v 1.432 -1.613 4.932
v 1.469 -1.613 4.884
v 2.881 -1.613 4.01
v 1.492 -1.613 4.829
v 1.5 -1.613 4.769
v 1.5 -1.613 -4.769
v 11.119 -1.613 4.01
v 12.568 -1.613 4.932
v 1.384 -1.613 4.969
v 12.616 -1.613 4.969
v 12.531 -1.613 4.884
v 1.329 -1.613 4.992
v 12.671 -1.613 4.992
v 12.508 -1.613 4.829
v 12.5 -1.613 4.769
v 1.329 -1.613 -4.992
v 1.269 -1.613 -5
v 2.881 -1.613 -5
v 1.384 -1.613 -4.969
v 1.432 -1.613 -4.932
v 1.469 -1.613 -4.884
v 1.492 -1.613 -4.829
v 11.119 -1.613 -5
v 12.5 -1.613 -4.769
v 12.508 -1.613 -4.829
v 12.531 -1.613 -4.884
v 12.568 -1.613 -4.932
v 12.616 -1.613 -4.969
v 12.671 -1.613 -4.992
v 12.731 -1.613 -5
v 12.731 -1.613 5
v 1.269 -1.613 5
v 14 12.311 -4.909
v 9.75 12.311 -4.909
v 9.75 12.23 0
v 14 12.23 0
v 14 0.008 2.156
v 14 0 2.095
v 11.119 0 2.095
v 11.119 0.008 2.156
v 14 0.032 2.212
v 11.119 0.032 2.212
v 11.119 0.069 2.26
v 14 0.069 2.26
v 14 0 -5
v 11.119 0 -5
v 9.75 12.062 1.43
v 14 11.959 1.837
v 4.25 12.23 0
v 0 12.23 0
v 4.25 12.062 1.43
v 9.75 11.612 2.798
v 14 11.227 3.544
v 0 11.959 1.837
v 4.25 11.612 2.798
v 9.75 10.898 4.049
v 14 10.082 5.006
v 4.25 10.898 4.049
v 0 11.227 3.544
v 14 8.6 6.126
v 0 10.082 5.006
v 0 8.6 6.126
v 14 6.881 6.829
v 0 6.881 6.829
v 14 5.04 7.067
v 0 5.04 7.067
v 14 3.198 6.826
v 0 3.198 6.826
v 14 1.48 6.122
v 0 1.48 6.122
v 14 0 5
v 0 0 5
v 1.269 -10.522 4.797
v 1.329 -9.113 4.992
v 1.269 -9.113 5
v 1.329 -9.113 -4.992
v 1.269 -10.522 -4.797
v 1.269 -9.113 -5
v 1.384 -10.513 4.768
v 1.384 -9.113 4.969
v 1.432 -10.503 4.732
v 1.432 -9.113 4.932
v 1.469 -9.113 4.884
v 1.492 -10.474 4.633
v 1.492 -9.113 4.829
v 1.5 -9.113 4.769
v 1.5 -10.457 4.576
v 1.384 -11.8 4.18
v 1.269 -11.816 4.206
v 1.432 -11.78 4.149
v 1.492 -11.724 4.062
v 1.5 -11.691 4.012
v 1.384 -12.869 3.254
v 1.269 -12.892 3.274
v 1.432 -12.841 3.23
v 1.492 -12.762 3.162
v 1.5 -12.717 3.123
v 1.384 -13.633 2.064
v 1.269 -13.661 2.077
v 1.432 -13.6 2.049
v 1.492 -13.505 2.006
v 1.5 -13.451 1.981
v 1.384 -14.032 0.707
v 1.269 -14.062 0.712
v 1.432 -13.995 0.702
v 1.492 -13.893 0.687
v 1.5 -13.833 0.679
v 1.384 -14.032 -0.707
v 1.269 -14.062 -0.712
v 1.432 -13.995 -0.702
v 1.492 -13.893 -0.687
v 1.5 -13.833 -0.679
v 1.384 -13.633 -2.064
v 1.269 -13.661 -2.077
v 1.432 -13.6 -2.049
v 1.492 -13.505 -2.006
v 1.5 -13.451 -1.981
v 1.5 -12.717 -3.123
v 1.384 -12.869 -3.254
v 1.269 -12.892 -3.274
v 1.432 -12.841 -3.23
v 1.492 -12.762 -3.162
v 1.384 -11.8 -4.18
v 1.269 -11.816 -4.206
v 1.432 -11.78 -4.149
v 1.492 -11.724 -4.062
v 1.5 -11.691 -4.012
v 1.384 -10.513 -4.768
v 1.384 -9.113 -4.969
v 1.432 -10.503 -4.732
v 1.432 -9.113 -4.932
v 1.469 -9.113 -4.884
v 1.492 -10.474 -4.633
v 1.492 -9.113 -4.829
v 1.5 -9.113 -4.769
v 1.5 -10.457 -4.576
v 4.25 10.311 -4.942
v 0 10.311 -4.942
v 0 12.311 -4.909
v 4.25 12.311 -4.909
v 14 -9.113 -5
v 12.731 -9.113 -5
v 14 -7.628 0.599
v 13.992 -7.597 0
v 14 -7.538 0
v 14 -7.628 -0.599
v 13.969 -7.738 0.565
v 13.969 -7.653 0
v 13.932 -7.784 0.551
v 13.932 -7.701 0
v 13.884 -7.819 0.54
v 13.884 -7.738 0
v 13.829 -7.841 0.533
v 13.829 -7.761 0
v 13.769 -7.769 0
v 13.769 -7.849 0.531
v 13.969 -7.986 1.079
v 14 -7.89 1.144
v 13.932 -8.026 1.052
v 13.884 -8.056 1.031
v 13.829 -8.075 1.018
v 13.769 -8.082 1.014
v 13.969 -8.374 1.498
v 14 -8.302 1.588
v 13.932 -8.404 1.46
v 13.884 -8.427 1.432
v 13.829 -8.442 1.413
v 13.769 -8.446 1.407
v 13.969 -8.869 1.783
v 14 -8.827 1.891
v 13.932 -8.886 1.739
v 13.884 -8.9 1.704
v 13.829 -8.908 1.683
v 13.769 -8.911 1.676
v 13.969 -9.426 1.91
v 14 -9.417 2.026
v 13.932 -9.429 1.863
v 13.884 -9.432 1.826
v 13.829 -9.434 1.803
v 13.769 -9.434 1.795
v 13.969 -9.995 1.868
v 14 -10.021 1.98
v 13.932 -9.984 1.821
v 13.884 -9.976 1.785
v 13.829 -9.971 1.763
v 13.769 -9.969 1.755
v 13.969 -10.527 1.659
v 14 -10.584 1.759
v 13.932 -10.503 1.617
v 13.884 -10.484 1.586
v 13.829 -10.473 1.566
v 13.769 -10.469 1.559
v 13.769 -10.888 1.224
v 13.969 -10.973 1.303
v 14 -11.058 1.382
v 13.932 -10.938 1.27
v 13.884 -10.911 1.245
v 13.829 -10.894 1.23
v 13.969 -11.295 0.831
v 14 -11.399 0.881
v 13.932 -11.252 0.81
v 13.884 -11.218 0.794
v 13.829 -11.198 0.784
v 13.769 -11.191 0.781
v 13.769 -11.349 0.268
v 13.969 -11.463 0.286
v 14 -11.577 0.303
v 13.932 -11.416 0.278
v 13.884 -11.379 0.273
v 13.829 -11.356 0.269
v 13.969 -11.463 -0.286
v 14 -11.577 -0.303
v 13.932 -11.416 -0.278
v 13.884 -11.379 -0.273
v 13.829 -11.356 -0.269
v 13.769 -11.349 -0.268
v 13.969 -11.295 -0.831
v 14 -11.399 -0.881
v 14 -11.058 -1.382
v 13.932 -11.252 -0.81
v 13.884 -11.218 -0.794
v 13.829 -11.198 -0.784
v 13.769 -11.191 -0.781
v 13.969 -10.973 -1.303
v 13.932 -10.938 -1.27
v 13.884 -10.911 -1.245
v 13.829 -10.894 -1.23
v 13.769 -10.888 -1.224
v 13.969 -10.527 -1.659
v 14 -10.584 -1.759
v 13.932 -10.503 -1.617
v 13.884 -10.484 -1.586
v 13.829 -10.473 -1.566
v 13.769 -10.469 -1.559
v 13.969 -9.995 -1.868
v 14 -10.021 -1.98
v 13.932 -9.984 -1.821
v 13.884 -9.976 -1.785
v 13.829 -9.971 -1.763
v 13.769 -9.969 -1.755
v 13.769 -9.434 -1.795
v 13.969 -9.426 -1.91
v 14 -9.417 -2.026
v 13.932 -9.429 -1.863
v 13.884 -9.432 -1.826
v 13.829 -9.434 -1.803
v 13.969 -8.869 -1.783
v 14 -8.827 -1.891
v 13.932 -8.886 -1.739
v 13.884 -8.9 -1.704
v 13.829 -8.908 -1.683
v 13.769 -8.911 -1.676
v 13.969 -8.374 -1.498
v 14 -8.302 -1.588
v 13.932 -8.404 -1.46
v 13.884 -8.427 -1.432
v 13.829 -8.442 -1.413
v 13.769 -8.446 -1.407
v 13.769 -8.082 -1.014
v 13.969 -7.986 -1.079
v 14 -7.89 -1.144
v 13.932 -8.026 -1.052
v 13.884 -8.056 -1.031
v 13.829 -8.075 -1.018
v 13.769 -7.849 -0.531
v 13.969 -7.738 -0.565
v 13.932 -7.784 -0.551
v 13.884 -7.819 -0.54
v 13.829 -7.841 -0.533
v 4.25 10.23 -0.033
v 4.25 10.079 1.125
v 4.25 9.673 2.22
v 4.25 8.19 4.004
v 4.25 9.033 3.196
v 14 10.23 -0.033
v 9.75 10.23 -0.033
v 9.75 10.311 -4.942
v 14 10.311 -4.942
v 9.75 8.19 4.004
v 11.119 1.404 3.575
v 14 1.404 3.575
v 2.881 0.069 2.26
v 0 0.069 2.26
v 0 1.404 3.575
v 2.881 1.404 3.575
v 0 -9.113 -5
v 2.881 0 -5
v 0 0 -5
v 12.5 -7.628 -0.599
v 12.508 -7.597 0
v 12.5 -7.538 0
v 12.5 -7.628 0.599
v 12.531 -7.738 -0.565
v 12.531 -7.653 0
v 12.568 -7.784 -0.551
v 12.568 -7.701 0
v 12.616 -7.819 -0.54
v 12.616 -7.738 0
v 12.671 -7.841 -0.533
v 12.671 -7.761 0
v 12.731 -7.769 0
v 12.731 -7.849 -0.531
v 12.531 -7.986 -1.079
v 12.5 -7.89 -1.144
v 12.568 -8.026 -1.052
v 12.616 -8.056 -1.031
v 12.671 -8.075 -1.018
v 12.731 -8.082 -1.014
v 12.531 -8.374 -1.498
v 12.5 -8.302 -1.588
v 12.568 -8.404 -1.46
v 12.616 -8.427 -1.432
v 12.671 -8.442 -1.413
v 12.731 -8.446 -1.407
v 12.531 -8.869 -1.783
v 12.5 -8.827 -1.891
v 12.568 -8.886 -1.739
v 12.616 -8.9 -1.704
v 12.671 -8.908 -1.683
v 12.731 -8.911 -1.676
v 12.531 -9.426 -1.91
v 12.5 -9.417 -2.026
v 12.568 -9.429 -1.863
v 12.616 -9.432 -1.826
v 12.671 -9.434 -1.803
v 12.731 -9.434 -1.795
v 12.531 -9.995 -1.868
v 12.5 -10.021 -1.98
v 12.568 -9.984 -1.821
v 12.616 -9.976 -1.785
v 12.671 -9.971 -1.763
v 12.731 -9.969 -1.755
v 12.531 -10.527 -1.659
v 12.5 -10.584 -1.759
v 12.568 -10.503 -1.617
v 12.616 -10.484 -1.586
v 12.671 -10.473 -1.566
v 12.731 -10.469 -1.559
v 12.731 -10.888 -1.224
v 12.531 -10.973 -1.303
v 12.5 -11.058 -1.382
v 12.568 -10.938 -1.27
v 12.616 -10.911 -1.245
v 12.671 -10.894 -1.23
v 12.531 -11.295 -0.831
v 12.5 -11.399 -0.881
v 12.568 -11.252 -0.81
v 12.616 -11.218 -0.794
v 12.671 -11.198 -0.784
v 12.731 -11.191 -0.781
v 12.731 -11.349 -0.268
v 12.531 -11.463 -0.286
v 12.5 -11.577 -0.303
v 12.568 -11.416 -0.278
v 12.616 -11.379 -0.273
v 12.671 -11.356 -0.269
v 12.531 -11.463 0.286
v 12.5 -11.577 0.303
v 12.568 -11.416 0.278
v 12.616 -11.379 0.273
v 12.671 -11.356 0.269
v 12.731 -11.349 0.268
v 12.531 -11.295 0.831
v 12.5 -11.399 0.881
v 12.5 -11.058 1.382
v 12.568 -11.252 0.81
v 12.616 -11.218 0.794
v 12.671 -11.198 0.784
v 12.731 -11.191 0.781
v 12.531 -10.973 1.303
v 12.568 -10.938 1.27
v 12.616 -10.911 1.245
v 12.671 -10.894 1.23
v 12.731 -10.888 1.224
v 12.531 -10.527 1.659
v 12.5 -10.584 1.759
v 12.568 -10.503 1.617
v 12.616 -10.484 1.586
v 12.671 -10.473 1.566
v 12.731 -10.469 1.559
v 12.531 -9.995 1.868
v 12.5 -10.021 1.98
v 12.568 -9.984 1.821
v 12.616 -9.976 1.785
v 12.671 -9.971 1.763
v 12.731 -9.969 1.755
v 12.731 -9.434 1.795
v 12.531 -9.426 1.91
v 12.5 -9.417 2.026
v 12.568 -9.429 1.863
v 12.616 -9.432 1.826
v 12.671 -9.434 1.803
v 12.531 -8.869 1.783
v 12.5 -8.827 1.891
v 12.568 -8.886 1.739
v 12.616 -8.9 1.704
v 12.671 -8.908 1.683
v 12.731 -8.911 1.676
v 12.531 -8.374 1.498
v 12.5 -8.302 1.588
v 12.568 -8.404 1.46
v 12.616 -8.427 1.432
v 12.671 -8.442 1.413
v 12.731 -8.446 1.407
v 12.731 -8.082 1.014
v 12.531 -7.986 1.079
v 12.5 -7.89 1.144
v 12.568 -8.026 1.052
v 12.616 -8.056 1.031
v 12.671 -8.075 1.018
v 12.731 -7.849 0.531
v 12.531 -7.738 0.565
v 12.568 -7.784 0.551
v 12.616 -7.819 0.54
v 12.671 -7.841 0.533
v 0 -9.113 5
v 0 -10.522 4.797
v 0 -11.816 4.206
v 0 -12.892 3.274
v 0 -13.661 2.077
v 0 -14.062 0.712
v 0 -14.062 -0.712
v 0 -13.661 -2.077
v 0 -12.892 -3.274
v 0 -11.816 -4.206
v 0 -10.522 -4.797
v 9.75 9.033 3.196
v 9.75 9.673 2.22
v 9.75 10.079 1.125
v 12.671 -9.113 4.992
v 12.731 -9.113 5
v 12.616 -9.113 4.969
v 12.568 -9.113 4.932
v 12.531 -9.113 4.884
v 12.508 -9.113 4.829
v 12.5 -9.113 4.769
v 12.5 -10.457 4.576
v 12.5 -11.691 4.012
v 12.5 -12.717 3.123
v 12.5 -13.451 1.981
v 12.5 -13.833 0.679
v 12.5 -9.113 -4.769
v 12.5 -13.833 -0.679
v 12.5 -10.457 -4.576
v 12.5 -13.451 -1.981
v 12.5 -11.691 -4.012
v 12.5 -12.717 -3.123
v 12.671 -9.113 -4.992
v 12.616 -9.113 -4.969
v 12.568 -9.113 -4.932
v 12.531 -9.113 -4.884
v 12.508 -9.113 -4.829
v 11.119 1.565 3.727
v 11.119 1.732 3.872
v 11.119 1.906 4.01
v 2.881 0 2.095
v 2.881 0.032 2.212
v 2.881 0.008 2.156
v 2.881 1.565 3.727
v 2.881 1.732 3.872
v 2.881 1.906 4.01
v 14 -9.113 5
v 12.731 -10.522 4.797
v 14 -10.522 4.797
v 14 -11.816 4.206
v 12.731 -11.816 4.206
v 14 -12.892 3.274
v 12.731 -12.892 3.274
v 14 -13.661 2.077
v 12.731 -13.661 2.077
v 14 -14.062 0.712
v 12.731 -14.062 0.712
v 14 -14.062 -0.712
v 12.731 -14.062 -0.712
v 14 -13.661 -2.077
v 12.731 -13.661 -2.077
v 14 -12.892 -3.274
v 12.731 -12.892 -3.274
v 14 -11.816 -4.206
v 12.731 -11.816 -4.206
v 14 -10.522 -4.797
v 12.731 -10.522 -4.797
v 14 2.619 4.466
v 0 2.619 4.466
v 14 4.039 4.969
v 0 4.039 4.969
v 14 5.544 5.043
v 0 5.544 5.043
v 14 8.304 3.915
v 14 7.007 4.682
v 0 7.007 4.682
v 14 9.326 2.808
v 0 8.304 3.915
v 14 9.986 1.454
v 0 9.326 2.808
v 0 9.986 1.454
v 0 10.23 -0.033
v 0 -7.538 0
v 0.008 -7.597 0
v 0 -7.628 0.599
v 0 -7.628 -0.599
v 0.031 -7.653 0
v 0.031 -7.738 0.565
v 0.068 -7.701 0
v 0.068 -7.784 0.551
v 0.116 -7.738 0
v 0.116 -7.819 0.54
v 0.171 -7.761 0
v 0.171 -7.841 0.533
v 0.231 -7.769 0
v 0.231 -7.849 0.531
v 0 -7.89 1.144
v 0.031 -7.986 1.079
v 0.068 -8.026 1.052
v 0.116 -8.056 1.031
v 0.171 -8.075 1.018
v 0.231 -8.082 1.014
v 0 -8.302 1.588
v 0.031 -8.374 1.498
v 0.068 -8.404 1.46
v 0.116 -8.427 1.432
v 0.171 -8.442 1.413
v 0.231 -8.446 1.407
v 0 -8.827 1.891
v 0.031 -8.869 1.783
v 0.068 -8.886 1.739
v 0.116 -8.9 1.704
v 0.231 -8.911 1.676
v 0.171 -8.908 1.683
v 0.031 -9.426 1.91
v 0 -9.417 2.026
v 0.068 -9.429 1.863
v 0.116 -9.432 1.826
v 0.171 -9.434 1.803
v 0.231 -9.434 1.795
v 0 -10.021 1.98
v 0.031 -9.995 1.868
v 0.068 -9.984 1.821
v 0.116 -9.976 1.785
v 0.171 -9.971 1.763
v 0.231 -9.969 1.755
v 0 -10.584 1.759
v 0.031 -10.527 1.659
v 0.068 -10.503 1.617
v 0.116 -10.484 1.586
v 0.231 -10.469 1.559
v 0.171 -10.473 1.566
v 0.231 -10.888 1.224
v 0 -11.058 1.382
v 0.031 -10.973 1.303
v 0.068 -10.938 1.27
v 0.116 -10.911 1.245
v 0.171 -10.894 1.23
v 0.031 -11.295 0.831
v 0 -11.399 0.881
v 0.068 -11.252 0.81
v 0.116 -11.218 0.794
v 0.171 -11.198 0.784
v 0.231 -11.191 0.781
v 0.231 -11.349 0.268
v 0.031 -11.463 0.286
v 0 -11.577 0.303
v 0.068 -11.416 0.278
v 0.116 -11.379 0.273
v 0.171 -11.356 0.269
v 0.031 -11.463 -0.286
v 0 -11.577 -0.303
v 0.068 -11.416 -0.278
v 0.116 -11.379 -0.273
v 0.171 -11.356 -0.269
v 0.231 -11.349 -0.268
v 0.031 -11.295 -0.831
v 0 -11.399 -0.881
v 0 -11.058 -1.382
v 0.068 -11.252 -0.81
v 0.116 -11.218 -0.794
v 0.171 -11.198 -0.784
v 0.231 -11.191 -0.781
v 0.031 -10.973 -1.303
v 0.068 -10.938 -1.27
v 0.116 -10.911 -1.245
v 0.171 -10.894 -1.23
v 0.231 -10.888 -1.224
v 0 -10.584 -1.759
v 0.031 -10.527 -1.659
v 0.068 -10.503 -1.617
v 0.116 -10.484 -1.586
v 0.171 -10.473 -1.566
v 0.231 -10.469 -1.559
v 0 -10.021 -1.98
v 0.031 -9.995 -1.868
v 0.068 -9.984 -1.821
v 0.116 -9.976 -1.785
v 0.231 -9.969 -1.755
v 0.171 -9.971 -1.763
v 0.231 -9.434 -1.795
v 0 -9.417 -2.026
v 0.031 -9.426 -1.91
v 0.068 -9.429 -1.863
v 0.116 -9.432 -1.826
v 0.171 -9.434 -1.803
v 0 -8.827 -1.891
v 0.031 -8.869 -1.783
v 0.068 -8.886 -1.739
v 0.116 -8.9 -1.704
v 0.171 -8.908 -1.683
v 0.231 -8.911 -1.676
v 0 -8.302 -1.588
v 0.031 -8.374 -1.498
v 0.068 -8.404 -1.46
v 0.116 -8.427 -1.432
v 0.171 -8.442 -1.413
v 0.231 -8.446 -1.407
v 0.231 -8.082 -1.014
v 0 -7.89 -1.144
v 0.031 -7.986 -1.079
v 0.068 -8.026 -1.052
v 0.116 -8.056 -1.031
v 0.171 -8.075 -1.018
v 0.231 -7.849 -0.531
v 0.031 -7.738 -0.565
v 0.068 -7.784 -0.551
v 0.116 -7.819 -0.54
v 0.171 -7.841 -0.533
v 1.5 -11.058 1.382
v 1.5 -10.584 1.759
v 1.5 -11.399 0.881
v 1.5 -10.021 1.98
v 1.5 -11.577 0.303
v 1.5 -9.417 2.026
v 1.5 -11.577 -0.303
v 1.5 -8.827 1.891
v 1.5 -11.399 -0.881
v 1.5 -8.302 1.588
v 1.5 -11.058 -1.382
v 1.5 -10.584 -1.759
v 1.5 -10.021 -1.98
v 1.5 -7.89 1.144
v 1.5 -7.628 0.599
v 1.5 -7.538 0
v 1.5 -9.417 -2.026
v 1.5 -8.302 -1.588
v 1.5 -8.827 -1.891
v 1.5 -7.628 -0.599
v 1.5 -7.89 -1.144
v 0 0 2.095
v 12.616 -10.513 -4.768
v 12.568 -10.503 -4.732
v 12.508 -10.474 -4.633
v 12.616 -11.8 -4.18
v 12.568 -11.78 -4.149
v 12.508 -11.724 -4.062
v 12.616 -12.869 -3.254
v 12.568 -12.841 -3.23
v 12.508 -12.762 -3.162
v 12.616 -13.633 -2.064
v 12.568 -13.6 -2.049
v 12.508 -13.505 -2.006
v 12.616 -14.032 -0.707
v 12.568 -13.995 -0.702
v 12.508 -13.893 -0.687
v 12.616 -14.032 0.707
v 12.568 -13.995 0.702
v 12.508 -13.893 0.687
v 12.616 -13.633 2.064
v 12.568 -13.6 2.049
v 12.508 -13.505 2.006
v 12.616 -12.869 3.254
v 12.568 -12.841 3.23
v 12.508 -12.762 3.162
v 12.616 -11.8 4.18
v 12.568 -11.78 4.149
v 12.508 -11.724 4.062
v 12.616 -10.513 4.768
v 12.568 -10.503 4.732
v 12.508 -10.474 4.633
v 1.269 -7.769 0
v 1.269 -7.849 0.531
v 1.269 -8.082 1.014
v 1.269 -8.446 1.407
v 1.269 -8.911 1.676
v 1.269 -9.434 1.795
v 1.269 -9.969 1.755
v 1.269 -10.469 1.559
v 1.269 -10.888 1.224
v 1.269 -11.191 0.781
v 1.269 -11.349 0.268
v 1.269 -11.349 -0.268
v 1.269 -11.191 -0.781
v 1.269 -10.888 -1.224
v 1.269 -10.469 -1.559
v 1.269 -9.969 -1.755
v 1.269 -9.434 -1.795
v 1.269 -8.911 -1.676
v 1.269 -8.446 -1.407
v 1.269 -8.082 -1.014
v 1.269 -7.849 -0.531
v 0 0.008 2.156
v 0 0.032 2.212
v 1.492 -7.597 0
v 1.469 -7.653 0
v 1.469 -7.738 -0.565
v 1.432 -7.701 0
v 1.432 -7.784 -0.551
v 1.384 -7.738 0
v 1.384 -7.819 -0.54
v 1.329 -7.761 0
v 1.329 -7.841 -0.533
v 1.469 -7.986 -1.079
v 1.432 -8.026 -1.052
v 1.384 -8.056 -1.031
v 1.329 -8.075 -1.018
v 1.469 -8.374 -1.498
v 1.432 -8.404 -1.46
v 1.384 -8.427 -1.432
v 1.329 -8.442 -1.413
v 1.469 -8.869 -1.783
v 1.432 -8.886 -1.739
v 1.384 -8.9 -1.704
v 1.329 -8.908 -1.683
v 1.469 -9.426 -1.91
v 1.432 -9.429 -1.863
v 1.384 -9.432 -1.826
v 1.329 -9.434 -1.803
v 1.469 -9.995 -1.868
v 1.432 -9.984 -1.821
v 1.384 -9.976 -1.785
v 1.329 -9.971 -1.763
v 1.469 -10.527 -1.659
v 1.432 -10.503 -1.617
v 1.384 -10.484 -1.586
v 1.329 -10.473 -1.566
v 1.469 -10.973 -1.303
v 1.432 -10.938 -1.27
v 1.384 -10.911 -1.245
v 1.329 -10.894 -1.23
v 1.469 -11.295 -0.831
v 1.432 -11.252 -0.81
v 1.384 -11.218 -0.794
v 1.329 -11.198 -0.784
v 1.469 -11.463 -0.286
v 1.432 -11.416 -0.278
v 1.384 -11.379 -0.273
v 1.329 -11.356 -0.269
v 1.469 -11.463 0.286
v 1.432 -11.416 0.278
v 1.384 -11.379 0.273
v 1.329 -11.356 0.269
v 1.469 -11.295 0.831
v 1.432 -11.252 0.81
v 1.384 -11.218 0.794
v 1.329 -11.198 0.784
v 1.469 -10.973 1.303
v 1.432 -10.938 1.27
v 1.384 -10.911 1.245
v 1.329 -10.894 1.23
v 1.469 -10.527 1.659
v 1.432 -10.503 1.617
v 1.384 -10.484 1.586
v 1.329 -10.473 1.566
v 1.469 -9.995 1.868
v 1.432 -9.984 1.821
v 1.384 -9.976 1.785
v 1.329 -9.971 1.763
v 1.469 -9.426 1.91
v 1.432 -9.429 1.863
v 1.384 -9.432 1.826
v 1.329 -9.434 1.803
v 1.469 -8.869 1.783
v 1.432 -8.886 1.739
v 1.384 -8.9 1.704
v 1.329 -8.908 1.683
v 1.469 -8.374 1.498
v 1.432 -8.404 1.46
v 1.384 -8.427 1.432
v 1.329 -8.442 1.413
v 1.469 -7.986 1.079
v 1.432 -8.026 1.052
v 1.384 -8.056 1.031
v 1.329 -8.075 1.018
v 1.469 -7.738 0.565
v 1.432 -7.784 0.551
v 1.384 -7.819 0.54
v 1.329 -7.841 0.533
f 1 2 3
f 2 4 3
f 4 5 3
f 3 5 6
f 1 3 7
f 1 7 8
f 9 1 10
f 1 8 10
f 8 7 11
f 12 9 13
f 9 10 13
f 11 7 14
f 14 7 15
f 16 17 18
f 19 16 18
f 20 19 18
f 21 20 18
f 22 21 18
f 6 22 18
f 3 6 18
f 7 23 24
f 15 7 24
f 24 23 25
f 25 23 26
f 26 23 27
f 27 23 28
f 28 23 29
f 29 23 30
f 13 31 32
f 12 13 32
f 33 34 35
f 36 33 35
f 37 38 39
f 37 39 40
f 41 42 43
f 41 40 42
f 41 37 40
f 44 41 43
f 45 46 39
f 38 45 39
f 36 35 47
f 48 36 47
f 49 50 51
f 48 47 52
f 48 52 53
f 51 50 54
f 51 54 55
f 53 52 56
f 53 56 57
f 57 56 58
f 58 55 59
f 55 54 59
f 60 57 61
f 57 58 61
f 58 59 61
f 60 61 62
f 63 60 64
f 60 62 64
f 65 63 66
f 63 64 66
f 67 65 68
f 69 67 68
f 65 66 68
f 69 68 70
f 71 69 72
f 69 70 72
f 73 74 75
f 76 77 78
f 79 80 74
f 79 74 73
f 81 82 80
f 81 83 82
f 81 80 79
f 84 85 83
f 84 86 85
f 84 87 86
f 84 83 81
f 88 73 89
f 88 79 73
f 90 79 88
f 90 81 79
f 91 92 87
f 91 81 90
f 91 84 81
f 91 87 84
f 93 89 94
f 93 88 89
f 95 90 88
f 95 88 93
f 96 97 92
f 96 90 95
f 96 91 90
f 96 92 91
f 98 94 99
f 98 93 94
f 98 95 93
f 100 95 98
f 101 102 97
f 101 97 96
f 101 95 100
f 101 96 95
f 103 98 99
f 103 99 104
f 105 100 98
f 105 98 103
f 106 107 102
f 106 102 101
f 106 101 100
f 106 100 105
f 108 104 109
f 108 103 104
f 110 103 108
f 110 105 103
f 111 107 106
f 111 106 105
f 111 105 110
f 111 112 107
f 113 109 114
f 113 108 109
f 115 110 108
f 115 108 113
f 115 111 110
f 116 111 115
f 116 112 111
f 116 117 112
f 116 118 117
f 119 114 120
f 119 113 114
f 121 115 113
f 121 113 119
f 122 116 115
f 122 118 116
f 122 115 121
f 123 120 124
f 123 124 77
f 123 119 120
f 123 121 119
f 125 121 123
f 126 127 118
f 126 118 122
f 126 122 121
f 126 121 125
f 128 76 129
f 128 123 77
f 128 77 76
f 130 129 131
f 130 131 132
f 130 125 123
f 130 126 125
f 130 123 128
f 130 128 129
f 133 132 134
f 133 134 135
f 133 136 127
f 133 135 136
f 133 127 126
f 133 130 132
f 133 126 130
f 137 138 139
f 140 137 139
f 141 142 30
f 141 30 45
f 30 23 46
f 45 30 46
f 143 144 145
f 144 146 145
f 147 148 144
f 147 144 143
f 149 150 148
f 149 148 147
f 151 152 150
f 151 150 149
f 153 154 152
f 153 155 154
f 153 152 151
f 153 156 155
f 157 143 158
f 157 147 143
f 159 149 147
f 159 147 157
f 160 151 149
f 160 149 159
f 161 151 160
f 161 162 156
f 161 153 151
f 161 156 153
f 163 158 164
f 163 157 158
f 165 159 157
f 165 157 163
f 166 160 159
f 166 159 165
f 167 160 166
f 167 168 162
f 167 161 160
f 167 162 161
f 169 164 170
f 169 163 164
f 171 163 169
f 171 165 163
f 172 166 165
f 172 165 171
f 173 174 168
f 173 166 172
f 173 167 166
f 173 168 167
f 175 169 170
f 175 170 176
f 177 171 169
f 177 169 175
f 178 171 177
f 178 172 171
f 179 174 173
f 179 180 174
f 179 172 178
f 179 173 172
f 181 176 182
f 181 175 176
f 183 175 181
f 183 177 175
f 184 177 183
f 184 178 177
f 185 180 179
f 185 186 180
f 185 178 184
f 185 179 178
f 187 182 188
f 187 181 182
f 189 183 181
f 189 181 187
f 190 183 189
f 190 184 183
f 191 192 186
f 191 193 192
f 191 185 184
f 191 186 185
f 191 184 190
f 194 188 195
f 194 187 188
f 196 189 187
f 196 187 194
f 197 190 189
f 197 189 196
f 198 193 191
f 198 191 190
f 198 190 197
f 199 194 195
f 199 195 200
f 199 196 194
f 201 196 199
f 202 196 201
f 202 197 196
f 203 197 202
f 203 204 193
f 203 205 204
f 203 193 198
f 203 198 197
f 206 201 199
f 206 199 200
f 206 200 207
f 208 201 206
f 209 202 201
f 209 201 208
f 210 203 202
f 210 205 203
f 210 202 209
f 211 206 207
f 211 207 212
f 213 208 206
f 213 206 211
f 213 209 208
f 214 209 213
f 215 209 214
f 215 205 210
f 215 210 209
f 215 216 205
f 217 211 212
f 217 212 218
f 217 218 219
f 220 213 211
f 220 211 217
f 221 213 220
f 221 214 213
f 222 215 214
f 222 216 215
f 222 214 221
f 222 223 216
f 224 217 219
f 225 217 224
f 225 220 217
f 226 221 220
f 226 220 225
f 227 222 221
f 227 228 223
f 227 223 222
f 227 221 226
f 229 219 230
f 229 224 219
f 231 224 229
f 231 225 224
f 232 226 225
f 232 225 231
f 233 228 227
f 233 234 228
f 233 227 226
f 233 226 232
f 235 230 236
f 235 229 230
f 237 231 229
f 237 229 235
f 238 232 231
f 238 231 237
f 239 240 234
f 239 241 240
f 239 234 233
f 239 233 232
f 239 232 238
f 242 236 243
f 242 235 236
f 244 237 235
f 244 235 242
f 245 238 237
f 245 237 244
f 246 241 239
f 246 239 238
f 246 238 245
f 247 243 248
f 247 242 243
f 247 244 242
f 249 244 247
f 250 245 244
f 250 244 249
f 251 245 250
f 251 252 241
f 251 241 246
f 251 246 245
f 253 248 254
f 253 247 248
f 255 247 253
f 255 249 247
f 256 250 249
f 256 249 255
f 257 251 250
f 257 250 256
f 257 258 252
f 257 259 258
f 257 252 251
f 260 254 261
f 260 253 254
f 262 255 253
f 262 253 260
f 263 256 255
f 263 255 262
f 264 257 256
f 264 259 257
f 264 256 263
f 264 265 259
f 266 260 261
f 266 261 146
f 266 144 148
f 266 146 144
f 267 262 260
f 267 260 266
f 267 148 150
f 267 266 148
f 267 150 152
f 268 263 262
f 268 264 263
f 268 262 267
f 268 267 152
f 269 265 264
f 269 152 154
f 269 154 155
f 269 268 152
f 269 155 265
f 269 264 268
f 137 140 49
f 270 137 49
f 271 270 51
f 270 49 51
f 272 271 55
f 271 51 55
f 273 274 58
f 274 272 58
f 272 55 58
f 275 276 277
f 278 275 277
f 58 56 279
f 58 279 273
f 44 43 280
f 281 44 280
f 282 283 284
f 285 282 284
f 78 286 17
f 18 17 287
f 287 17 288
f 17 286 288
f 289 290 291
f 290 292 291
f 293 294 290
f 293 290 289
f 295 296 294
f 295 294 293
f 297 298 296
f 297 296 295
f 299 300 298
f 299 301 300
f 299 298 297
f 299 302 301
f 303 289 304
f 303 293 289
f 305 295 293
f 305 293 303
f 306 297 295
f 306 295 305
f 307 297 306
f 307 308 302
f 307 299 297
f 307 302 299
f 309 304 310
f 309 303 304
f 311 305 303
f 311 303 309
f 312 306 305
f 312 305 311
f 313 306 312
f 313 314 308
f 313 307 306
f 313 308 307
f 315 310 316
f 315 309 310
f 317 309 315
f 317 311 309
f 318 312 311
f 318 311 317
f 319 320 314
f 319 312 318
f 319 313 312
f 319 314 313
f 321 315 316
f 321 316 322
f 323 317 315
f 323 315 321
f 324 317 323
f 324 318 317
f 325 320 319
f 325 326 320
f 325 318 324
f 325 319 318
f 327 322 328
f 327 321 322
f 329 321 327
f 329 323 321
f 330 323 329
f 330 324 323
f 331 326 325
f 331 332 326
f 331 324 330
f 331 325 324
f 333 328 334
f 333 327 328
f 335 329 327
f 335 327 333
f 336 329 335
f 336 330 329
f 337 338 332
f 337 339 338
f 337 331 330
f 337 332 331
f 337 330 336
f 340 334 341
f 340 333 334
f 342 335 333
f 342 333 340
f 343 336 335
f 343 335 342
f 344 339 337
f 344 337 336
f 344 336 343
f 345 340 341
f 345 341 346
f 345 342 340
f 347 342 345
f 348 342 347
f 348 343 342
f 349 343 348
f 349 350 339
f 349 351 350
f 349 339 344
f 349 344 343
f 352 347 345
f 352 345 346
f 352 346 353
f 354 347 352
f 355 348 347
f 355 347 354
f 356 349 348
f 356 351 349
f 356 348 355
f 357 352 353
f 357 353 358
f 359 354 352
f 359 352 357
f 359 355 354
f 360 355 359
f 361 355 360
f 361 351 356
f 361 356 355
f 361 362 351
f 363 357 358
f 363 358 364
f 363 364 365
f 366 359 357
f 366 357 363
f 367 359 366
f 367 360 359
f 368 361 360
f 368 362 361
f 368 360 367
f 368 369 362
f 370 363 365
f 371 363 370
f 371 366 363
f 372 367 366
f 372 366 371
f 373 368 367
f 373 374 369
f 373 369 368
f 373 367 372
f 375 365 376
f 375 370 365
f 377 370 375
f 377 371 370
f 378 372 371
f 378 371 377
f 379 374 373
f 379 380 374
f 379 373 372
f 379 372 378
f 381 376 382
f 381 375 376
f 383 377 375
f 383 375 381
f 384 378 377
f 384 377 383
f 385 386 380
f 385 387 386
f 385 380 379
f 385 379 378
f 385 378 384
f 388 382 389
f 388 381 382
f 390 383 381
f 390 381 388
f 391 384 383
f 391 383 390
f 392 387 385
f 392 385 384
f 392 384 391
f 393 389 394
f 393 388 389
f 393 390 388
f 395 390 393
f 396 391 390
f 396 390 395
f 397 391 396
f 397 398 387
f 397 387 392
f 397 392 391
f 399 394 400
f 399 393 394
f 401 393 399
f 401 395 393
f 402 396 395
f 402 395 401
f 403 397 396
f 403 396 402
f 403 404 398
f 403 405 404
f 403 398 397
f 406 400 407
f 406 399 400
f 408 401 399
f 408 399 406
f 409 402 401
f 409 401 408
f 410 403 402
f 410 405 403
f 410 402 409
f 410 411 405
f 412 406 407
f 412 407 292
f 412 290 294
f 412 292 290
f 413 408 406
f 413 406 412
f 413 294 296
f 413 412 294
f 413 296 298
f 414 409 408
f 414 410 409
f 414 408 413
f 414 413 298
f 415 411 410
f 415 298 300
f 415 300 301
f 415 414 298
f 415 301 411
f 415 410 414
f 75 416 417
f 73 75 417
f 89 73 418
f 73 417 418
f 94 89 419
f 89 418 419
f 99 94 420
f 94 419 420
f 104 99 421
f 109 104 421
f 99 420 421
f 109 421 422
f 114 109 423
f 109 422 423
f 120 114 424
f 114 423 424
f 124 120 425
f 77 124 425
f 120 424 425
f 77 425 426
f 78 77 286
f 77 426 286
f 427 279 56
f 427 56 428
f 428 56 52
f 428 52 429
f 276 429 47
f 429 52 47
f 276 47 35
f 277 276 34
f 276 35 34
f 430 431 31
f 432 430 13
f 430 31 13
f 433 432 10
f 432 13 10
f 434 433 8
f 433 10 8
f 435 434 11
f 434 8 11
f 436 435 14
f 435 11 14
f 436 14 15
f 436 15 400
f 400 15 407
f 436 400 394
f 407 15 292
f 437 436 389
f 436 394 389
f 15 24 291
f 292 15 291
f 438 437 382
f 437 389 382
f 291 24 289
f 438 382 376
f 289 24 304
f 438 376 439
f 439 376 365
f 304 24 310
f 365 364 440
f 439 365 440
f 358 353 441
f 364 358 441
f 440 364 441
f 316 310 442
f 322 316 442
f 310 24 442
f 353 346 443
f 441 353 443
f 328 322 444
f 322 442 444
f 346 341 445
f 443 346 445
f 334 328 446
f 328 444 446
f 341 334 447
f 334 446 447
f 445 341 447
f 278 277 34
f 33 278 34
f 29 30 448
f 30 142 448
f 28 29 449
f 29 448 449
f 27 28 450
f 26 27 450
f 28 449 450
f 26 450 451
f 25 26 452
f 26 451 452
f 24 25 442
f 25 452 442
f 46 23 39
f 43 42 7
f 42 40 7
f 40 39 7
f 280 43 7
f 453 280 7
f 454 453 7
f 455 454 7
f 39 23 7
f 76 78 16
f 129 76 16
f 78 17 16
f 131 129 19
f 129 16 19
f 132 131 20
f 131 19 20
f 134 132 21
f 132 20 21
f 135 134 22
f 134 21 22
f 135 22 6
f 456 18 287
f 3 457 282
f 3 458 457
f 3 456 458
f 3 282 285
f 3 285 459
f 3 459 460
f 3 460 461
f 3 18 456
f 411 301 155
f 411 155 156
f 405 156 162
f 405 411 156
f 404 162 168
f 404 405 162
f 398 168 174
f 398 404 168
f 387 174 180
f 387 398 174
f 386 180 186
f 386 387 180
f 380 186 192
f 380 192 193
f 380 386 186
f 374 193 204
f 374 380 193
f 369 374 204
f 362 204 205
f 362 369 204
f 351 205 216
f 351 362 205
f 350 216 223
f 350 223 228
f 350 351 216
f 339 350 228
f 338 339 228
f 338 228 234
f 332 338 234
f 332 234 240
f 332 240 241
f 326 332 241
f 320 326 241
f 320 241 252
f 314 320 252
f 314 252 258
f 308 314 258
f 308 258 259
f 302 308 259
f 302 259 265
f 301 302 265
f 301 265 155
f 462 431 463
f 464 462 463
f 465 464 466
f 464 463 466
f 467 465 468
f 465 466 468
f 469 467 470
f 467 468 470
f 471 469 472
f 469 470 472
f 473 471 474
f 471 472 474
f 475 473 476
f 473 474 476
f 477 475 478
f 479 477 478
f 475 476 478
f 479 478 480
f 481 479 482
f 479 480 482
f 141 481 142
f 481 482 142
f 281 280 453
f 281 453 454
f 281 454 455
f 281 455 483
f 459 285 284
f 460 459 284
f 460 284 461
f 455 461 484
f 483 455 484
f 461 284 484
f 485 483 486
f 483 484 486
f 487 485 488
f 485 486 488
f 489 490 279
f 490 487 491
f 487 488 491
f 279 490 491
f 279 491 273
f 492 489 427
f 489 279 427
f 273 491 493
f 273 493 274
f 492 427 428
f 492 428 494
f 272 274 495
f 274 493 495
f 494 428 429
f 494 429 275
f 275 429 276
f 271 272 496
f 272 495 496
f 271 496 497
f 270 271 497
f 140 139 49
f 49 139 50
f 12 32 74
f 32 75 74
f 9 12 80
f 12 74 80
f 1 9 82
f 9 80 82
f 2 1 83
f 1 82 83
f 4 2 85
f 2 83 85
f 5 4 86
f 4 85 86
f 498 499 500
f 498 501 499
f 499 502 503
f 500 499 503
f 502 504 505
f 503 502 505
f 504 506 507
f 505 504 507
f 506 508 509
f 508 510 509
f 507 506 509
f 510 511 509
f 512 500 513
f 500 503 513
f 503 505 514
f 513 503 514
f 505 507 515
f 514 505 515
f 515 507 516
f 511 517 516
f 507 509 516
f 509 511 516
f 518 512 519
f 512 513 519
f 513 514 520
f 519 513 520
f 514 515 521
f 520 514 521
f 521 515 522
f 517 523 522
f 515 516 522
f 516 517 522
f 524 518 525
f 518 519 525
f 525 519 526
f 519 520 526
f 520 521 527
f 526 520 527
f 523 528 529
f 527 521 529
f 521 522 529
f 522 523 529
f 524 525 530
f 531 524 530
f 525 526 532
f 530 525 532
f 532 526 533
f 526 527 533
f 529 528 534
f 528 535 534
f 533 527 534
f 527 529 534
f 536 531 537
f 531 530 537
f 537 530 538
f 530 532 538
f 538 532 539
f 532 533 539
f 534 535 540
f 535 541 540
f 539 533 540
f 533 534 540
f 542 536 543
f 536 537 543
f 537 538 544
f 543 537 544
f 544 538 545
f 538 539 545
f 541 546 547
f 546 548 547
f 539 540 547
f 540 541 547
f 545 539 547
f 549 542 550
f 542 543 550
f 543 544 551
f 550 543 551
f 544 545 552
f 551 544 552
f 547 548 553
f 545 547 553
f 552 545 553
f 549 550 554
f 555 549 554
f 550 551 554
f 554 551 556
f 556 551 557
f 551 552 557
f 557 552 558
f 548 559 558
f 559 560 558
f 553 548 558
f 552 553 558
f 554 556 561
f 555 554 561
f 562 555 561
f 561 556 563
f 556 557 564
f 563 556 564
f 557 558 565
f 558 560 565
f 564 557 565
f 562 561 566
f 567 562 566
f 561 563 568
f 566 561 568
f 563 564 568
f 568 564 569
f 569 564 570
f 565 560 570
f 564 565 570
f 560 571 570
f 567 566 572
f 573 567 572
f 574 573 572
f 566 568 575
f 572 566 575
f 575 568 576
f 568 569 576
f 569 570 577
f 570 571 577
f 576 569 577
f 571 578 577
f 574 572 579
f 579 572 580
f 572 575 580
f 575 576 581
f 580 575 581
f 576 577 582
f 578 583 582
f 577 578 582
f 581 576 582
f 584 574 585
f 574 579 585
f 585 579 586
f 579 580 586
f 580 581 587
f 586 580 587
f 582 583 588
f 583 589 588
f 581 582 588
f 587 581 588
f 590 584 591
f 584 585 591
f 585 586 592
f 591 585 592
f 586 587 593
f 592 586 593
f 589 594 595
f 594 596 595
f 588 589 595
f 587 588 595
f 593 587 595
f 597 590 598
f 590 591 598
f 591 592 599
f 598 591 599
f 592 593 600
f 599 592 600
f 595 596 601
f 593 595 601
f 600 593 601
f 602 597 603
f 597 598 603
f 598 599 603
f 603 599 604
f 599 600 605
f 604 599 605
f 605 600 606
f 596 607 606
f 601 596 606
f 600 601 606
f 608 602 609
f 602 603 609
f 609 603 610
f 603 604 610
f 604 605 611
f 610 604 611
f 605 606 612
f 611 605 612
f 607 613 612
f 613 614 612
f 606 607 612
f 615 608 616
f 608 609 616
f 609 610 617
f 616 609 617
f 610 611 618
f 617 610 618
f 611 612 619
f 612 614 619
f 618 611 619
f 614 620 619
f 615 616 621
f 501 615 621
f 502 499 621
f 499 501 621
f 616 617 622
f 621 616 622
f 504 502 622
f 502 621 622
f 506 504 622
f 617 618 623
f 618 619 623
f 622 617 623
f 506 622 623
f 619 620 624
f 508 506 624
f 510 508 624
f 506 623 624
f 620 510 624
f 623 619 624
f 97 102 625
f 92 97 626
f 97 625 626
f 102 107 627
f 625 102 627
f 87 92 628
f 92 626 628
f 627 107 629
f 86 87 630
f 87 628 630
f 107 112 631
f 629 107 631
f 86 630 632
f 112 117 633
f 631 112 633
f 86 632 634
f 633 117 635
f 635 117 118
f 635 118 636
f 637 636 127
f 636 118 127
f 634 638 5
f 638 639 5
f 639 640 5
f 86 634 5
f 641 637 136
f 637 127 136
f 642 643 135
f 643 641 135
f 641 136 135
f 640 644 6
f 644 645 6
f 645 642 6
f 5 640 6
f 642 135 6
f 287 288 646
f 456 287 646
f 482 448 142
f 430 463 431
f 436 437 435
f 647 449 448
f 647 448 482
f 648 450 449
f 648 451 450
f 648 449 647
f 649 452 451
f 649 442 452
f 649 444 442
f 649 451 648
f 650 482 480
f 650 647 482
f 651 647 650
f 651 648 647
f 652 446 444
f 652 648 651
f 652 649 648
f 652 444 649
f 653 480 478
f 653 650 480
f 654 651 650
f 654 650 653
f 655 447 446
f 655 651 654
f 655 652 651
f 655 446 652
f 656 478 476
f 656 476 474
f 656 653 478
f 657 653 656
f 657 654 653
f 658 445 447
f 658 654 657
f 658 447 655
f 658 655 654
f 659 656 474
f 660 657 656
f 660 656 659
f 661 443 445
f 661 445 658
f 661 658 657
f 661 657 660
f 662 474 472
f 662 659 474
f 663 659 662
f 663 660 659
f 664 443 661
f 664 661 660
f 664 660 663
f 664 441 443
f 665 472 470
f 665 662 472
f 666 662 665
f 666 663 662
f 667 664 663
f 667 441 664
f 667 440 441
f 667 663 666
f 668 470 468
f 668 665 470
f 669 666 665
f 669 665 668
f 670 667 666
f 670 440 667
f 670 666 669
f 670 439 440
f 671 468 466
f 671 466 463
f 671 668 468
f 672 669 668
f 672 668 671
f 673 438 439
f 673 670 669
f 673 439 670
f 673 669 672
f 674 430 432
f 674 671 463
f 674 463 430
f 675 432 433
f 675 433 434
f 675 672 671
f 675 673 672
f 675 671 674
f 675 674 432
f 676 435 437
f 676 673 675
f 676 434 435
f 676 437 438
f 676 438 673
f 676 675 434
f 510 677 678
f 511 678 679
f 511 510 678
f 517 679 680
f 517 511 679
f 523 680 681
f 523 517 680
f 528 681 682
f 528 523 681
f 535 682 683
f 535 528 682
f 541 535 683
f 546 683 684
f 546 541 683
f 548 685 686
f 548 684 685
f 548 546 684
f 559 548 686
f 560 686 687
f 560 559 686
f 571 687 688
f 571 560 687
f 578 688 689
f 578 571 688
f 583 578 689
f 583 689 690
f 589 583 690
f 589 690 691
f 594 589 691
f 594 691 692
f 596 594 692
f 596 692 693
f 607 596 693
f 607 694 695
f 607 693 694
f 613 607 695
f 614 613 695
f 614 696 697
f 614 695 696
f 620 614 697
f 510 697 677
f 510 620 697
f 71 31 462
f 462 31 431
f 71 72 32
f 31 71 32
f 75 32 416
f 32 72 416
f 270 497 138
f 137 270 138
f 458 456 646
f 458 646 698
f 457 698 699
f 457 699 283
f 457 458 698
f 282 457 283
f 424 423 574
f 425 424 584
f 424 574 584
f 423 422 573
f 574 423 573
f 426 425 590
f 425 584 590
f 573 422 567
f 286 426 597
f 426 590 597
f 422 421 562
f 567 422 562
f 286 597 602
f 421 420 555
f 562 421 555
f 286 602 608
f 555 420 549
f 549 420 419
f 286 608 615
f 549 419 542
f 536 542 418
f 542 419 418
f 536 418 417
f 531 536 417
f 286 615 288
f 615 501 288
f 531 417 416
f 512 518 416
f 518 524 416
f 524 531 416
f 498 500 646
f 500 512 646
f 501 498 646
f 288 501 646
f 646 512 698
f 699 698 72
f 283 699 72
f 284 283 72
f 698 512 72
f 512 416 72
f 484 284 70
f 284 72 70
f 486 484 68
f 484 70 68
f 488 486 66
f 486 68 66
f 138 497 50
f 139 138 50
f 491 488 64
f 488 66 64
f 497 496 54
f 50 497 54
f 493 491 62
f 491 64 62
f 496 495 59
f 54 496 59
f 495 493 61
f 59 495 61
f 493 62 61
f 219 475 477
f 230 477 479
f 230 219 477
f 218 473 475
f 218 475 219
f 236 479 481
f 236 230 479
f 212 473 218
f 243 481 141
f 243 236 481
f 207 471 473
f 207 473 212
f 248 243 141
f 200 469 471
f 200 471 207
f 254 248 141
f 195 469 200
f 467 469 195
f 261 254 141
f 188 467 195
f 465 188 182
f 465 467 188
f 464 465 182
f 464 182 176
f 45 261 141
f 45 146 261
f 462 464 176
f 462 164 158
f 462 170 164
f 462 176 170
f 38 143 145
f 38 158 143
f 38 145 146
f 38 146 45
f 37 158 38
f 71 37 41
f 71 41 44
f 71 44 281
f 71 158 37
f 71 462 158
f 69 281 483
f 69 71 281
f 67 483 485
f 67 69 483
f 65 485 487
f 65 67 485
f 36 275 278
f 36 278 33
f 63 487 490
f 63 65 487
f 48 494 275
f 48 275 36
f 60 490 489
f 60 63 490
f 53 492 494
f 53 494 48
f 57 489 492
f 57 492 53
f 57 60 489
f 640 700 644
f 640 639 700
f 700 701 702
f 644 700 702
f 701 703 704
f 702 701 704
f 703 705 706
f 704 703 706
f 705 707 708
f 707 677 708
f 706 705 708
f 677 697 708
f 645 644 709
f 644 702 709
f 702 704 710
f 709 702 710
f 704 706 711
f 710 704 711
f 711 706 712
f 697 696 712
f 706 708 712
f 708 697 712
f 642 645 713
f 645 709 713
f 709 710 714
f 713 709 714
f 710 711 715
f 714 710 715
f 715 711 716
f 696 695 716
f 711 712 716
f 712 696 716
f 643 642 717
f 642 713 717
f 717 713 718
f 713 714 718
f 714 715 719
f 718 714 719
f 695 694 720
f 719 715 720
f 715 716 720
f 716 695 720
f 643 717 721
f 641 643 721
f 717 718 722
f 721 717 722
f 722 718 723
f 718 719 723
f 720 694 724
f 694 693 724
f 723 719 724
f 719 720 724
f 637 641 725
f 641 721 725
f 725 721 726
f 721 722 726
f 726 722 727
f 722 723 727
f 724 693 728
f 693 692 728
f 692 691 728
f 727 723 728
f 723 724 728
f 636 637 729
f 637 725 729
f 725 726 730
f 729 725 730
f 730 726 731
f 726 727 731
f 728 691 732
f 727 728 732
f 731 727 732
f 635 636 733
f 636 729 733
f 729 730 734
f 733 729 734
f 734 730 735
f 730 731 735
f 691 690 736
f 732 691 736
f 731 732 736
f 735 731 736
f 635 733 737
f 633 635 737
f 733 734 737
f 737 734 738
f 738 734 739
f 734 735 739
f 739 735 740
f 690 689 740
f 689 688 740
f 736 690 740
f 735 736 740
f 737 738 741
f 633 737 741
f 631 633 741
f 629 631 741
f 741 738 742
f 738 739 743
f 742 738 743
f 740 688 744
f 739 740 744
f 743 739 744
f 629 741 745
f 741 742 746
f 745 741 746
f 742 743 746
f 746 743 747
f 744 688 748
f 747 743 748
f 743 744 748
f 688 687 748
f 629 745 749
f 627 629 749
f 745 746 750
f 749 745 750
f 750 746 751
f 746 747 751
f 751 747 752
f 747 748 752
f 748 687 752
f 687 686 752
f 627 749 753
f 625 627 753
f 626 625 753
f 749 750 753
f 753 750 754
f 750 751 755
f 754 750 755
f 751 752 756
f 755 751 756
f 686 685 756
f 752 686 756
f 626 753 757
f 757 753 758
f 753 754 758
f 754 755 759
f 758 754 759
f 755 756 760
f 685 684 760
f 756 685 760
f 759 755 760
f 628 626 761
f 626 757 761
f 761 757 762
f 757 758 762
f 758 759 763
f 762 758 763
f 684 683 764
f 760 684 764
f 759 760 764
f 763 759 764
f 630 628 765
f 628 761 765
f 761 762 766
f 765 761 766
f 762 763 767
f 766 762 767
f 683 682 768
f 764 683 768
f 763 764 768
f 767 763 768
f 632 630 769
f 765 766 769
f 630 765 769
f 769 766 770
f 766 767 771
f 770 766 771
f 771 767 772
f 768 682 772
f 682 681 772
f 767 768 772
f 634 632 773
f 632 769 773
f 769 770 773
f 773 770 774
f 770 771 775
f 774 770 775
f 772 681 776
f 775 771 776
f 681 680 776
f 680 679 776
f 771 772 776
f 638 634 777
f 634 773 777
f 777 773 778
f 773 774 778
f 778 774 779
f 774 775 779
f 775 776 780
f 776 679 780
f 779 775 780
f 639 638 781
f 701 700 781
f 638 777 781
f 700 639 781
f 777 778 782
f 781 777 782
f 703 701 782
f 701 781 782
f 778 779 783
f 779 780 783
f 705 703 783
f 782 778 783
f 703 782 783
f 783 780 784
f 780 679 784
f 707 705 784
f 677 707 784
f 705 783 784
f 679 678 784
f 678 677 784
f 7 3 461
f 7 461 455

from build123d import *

# Parameters (mm, degrees)
F0_R     = 1.8
F1_DEPTH = 14
F2_W     = 5.5
F2_H     = 4.0708386075
F2_H_2   = 4.9094793208
F3_DEPTH = 5
F4_W     = 11
F4_H     = 7.5
F5_DEPTH = 12
F6_R     = 0.2312376478
F7_W     = 8.2372972146
F7_H     = 9.0102642961
F8_DEPTH = 5


# Not quite as in the source:
# - a feature names something its author has since deleted; it is built from what else it names


with BuildPart() as f1:
    # F0 (on Right) → F1 (new body)
    with BuildSketch(Plane.YZ):
        with BuildLine():
            Line((-9.1132364464, -5), (0, -5))
            Line((0, -5), (0, 2.1922827341))
            Line((0, 2.1922827341), (1.4037047395, 3.5753551798))
            ThreePointArc((1.4037047395, 3.5753551798), (7.0067613017, 4.6816844814), (10.2298574217, -0.0331706346))
            Line((10.2298574217, -0.0331706346), (10.3112826954, -4.9419746769))
            Line((10.3112826954, -4.9419746769), (12.3110075686, -4.9088040424))
            Line((12.3110075686, -4.9088040424), (12.2295822948, 0))
            ThreePointArc((12.2295822948, 0), (7.7636365241, 6.5329380451), (0, 5))
            Line((0, 5), (-9.1132364464, 5))
            ThreePointArc((-9.1132364464, 5), (-14.1132364464, 0), (-9.1132364464, -5))
        make_face()
        with Locations((-9.5687768728, 0)):
            Circle(F0_R, mode=Mode.SUBTRACT)
    extrude(amount=F1_DEPTH)

    # F2 (on face) → F3 (cut)
    with BuildSketch(Plane(origin=(0, 12.2262182699, 0.2028036077), x_dir=(-1, 0, 0), z_dir=(0, 0.9998624542, 0.0165853176))):
        with Locations((-7, 1.8325877974)):
            Rectangle(F2_W, F2_H)
        with Locations((-7, -2.6575711668)):
            Rectangle(F2_W, F2_H_2)
    extrude(amount=-F3_DEPTH, mode=Mode.SUBTRACT)

    # F4 (on face) → F5 (cut)
    with BuildSketch(Plane(origin=(0, 0, -5), x_dir=(1, 0, 0), z_dir=(0, 0, -1))):
        with Locations((7, 5.3632364464)):
            Rectangle(F4_W, F4_H)
        with Locations((7, 12.8632364464)):
            Rectangle(F4_W, F4_H)
    extrude(amount=-F5_DEPTH, mode=Mode.SUBTRACT)

    # F6
    f6_edges = [f1.edges().sort_by_distance(p)[0] for p in [
        (1.5, -11.368777, 0),
        (12.5, -11.368777, 0),
        (0, -11.368777, 0),
        (14, -11.368777, 0),
        (7, 0, 2.192283),
        (12.5, -5.363236, -5),
        (1.5, -5.363236, -5),
        (12.5, -14.113236, 0),
        (12.5, -5.363236, 5),
        (1.5, -5.363236, 5),
        (1.5, -14.113236, 0),
    ]]
    fillet(f6_edges, radius=F6_R)

    # F7 (on face) → F8 (cut)
    with BuildSketch(Plane.XZ.offset(1.6132364464)):
        with Locations((7, -0.494867852)):
            Rectangle(F7_W, F7_H)
    extrude(amount=-F8_DEPTH, mode=Mode.SUBTRACT)


with BuildPart() as f9_1:
    # F9: copy of F1
    add(f1.part)


with BuildPart() as f11_1:
    # F11: copy of F1
    add(f1.part)


solid = f1.part
